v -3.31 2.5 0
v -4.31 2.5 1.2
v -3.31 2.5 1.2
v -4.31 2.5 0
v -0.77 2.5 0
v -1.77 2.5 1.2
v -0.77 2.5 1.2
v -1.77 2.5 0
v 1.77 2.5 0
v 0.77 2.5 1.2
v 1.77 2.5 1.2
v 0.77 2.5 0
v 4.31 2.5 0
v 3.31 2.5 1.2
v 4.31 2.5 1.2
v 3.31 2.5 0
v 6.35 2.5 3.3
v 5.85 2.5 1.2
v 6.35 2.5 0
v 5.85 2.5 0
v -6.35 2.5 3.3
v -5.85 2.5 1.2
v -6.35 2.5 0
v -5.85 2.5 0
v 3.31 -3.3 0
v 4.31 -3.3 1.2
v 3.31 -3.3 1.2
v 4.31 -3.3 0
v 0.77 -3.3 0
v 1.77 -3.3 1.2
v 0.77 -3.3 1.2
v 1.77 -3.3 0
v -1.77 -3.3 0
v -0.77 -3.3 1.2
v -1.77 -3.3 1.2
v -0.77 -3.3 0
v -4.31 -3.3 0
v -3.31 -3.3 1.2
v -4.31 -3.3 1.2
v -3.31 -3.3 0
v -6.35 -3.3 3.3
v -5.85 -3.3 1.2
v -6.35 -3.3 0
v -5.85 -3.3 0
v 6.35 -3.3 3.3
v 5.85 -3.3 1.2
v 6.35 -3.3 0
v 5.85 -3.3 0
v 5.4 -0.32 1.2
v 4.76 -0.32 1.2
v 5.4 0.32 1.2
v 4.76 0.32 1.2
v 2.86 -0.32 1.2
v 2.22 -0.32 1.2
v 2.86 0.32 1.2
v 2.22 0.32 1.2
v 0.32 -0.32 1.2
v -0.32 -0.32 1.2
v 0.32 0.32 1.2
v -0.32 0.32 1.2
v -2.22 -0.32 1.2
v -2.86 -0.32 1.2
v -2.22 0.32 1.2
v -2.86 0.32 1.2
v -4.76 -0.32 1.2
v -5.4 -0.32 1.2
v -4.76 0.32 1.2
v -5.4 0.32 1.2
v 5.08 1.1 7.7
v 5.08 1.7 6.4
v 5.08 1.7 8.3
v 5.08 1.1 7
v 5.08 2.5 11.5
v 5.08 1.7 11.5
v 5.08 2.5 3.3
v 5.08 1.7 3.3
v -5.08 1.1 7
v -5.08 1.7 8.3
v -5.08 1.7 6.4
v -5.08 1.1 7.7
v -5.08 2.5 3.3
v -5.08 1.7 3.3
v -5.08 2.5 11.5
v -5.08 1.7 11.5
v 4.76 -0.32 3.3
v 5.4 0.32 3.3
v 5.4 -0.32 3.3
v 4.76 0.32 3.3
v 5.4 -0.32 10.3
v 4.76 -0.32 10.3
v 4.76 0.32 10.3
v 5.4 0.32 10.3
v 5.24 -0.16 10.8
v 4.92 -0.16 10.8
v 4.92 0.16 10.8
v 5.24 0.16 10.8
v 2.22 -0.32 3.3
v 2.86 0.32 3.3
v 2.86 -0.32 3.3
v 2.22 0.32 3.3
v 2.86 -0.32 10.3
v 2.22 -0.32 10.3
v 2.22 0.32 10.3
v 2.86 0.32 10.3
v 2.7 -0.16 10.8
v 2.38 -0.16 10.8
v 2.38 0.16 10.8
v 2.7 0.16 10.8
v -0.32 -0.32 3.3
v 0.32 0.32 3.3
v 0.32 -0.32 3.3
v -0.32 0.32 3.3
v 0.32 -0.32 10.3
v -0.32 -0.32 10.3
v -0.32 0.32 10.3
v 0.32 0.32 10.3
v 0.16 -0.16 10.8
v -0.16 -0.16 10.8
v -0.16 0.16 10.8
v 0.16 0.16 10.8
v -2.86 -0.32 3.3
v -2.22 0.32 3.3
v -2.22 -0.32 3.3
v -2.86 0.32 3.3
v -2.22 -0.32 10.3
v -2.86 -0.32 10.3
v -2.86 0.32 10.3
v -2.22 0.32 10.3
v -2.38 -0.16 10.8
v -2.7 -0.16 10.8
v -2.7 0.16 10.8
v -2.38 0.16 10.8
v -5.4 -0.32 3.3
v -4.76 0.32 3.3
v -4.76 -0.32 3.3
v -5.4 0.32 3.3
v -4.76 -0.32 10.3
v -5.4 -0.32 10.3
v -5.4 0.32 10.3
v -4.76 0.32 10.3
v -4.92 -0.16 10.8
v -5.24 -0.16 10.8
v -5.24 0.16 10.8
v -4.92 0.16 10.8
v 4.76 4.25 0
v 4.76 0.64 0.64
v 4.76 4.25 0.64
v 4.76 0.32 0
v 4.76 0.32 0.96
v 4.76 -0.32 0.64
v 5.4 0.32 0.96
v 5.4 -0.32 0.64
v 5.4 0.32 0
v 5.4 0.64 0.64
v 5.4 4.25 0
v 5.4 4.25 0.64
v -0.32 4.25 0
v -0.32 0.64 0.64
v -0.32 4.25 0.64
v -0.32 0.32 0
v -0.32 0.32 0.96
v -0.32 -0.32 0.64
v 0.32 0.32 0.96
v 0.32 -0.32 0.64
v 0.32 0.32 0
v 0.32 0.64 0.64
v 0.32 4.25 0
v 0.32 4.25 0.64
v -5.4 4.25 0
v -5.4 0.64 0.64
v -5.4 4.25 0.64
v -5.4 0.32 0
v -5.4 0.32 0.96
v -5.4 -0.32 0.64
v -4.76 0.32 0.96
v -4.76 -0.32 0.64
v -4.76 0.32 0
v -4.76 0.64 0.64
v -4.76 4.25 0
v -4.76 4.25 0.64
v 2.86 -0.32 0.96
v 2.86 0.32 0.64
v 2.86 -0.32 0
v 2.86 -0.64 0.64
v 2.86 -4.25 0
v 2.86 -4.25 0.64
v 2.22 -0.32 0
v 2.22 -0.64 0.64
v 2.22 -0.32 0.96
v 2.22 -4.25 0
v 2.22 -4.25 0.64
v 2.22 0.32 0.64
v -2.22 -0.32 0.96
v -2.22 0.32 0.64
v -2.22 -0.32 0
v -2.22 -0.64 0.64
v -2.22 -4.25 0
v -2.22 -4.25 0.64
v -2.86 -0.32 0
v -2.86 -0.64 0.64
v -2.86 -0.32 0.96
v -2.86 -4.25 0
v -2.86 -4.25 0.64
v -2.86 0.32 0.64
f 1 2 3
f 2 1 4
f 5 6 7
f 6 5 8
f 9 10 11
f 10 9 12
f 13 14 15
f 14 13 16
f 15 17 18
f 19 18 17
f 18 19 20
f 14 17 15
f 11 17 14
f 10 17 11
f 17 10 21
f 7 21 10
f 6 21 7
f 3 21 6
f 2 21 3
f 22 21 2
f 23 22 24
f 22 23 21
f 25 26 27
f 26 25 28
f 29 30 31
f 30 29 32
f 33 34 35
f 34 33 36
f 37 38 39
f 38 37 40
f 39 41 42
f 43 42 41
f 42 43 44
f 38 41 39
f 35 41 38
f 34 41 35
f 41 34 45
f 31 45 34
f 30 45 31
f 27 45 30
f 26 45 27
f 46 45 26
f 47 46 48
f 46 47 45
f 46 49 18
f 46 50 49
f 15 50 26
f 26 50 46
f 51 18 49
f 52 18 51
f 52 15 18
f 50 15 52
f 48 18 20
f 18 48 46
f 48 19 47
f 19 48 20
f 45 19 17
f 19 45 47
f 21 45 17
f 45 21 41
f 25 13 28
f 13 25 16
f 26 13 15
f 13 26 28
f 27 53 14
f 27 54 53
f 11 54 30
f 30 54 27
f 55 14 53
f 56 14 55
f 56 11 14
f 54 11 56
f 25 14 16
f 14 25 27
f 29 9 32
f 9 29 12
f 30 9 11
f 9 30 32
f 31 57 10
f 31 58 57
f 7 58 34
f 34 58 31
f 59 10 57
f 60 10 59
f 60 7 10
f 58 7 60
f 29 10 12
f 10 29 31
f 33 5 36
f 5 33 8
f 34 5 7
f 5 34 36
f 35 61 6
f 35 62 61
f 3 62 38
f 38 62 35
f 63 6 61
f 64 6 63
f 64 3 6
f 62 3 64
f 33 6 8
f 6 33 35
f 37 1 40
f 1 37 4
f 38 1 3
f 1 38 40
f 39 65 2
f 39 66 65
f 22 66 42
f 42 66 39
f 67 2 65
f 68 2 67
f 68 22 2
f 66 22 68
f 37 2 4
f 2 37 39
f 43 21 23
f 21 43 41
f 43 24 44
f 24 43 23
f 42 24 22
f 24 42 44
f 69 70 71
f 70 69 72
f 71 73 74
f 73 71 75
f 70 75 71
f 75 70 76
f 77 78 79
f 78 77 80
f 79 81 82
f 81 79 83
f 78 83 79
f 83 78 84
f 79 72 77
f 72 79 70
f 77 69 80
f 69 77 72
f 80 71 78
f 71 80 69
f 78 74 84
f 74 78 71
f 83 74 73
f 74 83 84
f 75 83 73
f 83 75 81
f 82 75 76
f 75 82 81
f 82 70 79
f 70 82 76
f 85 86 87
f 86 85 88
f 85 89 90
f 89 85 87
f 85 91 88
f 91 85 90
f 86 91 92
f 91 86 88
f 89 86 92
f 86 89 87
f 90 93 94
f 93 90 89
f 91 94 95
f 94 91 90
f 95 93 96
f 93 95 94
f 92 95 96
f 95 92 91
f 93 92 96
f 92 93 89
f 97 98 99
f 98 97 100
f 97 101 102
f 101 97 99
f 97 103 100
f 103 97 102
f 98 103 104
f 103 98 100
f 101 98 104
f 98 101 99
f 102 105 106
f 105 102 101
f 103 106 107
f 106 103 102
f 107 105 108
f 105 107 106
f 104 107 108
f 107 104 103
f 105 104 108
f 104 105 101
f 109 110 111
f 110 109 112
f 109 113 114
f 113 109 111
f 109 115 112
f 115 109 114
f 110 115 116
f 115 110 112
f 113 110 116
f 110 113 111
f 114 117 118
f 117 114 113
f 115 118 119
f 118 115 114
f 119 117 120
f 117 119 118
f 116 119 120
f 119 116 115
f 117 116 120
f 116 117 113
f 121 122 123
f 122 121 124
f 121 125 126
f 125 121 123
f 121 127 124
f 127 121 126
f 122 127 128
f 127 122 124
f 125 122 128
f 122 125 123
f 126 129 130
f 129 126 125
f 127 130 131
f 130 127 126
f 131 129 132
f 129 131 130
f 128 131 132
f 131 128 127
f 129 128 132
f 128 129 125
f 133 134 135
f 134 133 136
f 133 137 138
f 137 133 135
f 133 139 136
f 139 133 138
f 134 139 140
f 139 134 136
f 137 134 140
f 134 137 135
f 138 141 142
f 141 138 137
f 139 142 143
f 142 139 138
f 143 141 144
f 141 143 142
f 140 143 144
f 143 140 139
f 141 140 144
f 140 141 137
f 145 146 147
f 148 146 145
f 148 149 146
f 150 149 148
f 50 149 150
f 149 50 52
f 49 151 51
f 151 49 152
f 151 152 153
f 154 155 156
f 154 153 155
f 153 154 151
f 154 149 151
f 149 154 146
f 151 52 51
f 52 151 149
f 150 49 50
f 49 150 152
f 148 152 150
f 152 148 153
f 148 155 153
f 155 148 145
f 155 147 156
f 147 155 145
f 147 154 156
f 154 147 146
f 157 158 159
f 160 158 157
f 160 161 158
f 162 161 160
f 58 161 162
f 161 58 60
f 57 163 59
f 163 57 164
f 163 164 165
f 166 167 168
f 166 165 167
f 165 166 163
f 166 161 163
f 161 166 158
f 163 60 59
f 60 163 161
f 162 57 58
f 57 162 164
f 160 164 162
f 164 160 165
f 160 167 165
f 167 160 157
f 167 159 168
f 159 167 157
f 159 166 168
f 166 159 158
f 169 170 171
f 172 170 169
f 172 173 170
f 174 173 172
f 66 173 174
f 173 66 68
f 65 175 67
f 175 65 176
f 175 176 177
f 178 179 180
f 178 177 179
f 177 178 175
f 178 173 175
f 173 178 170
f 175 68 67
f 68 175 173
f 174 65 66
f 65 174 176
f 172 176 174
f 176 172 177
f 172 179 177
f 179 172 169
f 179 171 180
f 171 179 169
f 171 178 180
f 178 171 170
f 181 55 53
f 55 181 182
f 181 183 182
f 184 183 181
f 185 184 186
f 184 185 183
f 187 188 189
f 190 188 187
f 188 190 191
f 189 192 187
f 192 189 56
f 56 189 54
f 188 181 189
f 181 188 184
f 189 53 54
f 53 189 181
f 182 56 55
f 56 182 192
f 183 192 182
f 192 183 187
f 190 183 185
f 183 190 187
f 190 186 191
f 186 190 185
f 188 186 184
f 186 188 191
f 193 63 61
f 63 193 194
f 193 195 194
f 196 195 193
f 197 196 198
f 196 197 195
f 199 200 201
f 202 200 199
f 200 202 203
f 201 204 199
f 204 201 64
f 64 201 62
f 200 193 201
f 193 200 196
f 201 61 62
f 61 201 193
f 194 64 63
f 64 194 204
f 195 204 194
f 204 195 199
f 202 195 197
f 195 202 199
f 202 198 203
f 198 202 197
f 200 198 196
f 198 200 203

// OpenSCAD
//	ПРОГРАММА ОТРИСОВКИ РАЗЪЕМОВ ТИПА WF-xx

//	Сначала нужно экспортировать ПО-ОТДЕЛЬНОСТИ корпус разъема и контакты в формат .STL (не забываем рендерить изображение перед каждым экспортом). Что именно в данный момент будет нарисовано - определяется параметрами Housing_Enable и Pins_Enable. Есть также возможность выбрать тип и количество контактов (см. параметры Pins_Type и Pins_Number).

//	После экспорта открываем STL-файлы в FreeCAD и экспортируем их снова в STL. Это надо для того, чтобы STL-файлы стали хорошими, а то OpenSCAD их делает какими-то кривыми.

//	Далее в Wings3D (обязательно должен быть открыт в окне, а не в полнооконном режиме) формируем разные типы разъемов при помощи комбинирования файлов STL для корпуса и разных типов контактов (File => Import => StereoLithography). Например, для получения SMD-разъема WF-xxS надо импортировать файл корпуса и файл SMD-контактов. Теперь полученный разъем надо раскрасить. В Wings3D сначала открываем список элементов (Window => Outliner) и окно палитры (Window => Palette), затем вверху выбираем полностью красный кубик (самый правый, "Body Selection Mode"). Щелкаем левой кнопкой на корпус разъема (должен полностью выделиться) и назначаем ему цвет из палитры, после чего снова щелкаем на корпусе (выделение должно полностью сняться). Проделываем то же самое с контактами (для обычных незолоченых белых контактов RGB обычно делается равным 0.8/0.8/0.8). Далее выделяем и корпус, и контакты (т.е. все элементы разъема) и, щелкнув на разъеме правой кнопкой мыши, выбираем "Vertex Attribute" => "Color to Materials". Должно активироваться окно со списком элементов (Outliner). В данном окне нам надо отредактировать свойства цвета у корпуса и контактов. Щелкаем правой кнопкой мыши на соответствующий цвет и выбираем "Edit Material". В открывшемся окне сдвигаем на минимум движки у параметров "Ambient", "Specular" и "Emission" (т.е. у всех, кроме верхнего). Параметры "Vertex Color" (Ignore), "Shininess" (1.0) и "Opacity" (1.0) не трогаем. Далее щелкаем "ОК" и переходим к следующему цвету. Цвет материала "default" трогать не надо.

//	В завершении сохраняем полученную модель в формате .WRL (File => Export => VRML 2.0), после чего ее можно использовать в DipTrace. Единственное, на что нужно обратить внимание - при назначении созданной модели какому-либо корпусу в редакторе корпусов диптрэйса в качестве единиц измерения файла надо выбирать "Метры", иначе с масштабом получится беда.



Pins_Number	    = 5;		// количество контактов разъема

Pins_Type		= 3;		// тип контактов:	1 - прямые
							//					2 - угловые
							//					3 - SMD
						
Housing_Enable	= 1;		// необходимость отрисовки корпуса разъема (1 - рисовать, 0 - нет)
Pins_Enable		= 1;		// необходимость отрисовки выводов разъема (1 - рисовать, 0 - нет)


pitch = 2.54;           // расстояние между контактами
hh1   = 1.2;            // высота выемки тела
hh2   = 3.3;            // высота площадки
hh3   = 11.5-hh2;       // высота защелки
pth   = 0.64;           // толщина контактов
phr1  = 1.75;           // длинна вывода до изгиба

RotateVector = [
    [0,0,270],
    [0,270,90],
    [0,0,270]
];

TranslateVector = [
    [0, 0, 0],
    [2.5, 0, 1.75],
    [0, 0, 0]
];
	
 
rotate (RotateVector[Pins_Type-1])
translate(TranslateVector[Pins_Type-1]) 
translate([0, (Pins_Number - 1) * 1.27, 0])
{    
	
    // ФОРМИРОВАНИЕ КОРПУСА РАЗЪЕМА
	if (Housing_Enable	== 1) {
        
        color("White", 1.0) {
            
            // Формирование основания (куда втыкаются штыри)
            
            for (i = [0.00 : -1.00 : -(Pins_Number-1)])	{
            
                translate ([-2.5, -1.27, 0.00])
                rotate ([90, 0, 90]) {
                
                    #linear_extrude (height = 5.80) {
                        polygon ([	
                            [i*pitch + 0.00, 0.0],
                            [i*pitch + 0.50, 0.0],
                            [i*pitch + 0.50, hh1],
                            [i*pitch + 2.04, hh1],
                            [i*pitch + 2.04, 0.0],
                            [i*pitch + 2.54, 0.0],
                            [i*pitch + 2.54, hh2],
                            [i*pitch + 0.00, hh2]]
                        );
                    }
                }
            }	
        
            // Формирование защелки
        
            translate ([-2.5, 0.00, hh2])
            rotate ([90, 0, 0])
        
                linear_extrude (height = (Pins_Number-1)*2.54) {

                    polygon ([	[0.0, 0.0],
                                [0.0, hh3],
                                [0.8, hh3],
                                [0.8, 5.0],
                                [1.4, 4.4],
                                [1.4, 3.7],
                                [0.8, 3.1],
                                [0.8, 0.0]]);
                }
            }
        }
	


						

// ФОРМИРОВАНИЕ КОНТАКТОВ
	
	if (Pins_Enable	== 1)	{
        
        color ("Gold", 1.0) {

            
            for (i = [0.00 : -1.00 : -(Pins_Number-1)])	{
        
                // Формирование контактов, торчащих вверх из основания (т.е. на которые одевается "мама")
                union() {            
                    // Рисование "основной" части штырей	
                    translate ([0.00, i*pitch, hh2])
                        linear_extrude (height = 14.2-3.4-hh2-.5)
                            polygon ([
                                [+pth/2, +pth/2],
                                [+pth/2, -pth/2],
                                [-pth/2, -pth/2],
                                [-pth/2, +pth/2]]);
                    
                    // Рисование пирамидальных макушек штырей
                    translate ([0.00, i*pitch, 14.2-3.4-.5])
                        linear_extrude (height = 0.50, scale = 0.50)
                            polygon ([
                                [+pth/2, +pth/2],
                                [+pth/2, -pth/2],
                                [-pth/2, -pth/2],
                                [-pth/2, +pth/2]]);
                }
            }	
        
            
            // Формирование нижних частей контактов (т.е. которые монтируются на плату)
            
                // Контакты прямого типа
            
                if (Pins_Type == 1)	{
                
                    for (i = [0.00 : -1.00 : -(Pins_Number-1)])	{
                    
                        translate ([0.00, i*2.54, -3.40])
                        rotate ([0, 0, 0])

                        linear_extrude (height = 3.4+hh1)
            
                            polygon ([		[+pth/2, +pth/2],
                                            [+pth/2, -pth/2],
                                            [-pth/2, -pth/2],
                                            [-pth/2, +pth/2]]);
                    }			
                }
            
                
                // Контакты углового типа
                
                if (Pins_Type == 2)	{
                
                    for (i = [0.00 : -1.00: -(Pins_Number-1)])	{
                    
                        translate ([0.00, i*pitch - pth / 2, hh1])
                        rotate ([-90, -90, 0])

                        linear_extrude (height = 0.64)
            
                            polygon ([		[+0.0           , +pth/2],
                                            [+0.0           , -pth/2],
                                            [-phr1-hh1+pth  , -pth/2],
                                            [-phr1-hh1+pth/2, -pth  ],
                                            [-phr1-hh1+pth/2, -5.9  ],
                                            [-phr1-hh1-pth/2, -5.9  ],
                                            [-phr1-hh1-pth/2, -pth/2],
                                            [-phr1-hh1+pth/2, +pth/2]]);
                    }			
                }
                
                // Контакты SMD-типа
                
                if (Pins_Type == 3)	{
                
                    // Формируем контакты с нечетными номерами (1, 3, 5...)				
                    for (i = [0.00 : -2.00 : -(Pins_Number-1)])	{
                    
                        translate ([0.00, i*2.54 - 0.32, hh1])
                        rotate ([-90, -90, 0])
                        linear_extrude (height = pth)
                            polygon ([
                                [+0.00, +pth/2],
                                [+0.00, -pth/2],
                                [-2.04+1.8, -pth/2],
                                [-2.36+1.8, -pth],
                                [-2.36+1.8, -4.25],
                                [-3.00+1.8,	-4.25],
                                [-3.00+1.8, -pth/2],
                                [-2.36+1.8,	+pth/2]]);
                    }
                    
                    // Формируем контакты с четными номерами (2, 4, 6...)	
                    for (i = [-1.00 : -2.00 : -(Pins_Number-1)])	{
                    
                        translate ([0.00, i*2.54 + 0.32, hh1])
                        rotate ([-90, -90, 180])
                        linear_extrude (height = pth)
                            polygon ([
                                [+0.00, +pth/2],
                                [+0.00, -pth/2],
                                [-2.04+1.8, -pth/2],
                                [-2.36+1.8, -pth],
                                [-2.36+1.8, -4.25],
                                [-3.00+1.8,	-4.25],
                                [-3.00+1.8, -pth/2],
                                [-2.36+1.8,	+pth/2]]);
                    }			
                }
        }
    }
}
